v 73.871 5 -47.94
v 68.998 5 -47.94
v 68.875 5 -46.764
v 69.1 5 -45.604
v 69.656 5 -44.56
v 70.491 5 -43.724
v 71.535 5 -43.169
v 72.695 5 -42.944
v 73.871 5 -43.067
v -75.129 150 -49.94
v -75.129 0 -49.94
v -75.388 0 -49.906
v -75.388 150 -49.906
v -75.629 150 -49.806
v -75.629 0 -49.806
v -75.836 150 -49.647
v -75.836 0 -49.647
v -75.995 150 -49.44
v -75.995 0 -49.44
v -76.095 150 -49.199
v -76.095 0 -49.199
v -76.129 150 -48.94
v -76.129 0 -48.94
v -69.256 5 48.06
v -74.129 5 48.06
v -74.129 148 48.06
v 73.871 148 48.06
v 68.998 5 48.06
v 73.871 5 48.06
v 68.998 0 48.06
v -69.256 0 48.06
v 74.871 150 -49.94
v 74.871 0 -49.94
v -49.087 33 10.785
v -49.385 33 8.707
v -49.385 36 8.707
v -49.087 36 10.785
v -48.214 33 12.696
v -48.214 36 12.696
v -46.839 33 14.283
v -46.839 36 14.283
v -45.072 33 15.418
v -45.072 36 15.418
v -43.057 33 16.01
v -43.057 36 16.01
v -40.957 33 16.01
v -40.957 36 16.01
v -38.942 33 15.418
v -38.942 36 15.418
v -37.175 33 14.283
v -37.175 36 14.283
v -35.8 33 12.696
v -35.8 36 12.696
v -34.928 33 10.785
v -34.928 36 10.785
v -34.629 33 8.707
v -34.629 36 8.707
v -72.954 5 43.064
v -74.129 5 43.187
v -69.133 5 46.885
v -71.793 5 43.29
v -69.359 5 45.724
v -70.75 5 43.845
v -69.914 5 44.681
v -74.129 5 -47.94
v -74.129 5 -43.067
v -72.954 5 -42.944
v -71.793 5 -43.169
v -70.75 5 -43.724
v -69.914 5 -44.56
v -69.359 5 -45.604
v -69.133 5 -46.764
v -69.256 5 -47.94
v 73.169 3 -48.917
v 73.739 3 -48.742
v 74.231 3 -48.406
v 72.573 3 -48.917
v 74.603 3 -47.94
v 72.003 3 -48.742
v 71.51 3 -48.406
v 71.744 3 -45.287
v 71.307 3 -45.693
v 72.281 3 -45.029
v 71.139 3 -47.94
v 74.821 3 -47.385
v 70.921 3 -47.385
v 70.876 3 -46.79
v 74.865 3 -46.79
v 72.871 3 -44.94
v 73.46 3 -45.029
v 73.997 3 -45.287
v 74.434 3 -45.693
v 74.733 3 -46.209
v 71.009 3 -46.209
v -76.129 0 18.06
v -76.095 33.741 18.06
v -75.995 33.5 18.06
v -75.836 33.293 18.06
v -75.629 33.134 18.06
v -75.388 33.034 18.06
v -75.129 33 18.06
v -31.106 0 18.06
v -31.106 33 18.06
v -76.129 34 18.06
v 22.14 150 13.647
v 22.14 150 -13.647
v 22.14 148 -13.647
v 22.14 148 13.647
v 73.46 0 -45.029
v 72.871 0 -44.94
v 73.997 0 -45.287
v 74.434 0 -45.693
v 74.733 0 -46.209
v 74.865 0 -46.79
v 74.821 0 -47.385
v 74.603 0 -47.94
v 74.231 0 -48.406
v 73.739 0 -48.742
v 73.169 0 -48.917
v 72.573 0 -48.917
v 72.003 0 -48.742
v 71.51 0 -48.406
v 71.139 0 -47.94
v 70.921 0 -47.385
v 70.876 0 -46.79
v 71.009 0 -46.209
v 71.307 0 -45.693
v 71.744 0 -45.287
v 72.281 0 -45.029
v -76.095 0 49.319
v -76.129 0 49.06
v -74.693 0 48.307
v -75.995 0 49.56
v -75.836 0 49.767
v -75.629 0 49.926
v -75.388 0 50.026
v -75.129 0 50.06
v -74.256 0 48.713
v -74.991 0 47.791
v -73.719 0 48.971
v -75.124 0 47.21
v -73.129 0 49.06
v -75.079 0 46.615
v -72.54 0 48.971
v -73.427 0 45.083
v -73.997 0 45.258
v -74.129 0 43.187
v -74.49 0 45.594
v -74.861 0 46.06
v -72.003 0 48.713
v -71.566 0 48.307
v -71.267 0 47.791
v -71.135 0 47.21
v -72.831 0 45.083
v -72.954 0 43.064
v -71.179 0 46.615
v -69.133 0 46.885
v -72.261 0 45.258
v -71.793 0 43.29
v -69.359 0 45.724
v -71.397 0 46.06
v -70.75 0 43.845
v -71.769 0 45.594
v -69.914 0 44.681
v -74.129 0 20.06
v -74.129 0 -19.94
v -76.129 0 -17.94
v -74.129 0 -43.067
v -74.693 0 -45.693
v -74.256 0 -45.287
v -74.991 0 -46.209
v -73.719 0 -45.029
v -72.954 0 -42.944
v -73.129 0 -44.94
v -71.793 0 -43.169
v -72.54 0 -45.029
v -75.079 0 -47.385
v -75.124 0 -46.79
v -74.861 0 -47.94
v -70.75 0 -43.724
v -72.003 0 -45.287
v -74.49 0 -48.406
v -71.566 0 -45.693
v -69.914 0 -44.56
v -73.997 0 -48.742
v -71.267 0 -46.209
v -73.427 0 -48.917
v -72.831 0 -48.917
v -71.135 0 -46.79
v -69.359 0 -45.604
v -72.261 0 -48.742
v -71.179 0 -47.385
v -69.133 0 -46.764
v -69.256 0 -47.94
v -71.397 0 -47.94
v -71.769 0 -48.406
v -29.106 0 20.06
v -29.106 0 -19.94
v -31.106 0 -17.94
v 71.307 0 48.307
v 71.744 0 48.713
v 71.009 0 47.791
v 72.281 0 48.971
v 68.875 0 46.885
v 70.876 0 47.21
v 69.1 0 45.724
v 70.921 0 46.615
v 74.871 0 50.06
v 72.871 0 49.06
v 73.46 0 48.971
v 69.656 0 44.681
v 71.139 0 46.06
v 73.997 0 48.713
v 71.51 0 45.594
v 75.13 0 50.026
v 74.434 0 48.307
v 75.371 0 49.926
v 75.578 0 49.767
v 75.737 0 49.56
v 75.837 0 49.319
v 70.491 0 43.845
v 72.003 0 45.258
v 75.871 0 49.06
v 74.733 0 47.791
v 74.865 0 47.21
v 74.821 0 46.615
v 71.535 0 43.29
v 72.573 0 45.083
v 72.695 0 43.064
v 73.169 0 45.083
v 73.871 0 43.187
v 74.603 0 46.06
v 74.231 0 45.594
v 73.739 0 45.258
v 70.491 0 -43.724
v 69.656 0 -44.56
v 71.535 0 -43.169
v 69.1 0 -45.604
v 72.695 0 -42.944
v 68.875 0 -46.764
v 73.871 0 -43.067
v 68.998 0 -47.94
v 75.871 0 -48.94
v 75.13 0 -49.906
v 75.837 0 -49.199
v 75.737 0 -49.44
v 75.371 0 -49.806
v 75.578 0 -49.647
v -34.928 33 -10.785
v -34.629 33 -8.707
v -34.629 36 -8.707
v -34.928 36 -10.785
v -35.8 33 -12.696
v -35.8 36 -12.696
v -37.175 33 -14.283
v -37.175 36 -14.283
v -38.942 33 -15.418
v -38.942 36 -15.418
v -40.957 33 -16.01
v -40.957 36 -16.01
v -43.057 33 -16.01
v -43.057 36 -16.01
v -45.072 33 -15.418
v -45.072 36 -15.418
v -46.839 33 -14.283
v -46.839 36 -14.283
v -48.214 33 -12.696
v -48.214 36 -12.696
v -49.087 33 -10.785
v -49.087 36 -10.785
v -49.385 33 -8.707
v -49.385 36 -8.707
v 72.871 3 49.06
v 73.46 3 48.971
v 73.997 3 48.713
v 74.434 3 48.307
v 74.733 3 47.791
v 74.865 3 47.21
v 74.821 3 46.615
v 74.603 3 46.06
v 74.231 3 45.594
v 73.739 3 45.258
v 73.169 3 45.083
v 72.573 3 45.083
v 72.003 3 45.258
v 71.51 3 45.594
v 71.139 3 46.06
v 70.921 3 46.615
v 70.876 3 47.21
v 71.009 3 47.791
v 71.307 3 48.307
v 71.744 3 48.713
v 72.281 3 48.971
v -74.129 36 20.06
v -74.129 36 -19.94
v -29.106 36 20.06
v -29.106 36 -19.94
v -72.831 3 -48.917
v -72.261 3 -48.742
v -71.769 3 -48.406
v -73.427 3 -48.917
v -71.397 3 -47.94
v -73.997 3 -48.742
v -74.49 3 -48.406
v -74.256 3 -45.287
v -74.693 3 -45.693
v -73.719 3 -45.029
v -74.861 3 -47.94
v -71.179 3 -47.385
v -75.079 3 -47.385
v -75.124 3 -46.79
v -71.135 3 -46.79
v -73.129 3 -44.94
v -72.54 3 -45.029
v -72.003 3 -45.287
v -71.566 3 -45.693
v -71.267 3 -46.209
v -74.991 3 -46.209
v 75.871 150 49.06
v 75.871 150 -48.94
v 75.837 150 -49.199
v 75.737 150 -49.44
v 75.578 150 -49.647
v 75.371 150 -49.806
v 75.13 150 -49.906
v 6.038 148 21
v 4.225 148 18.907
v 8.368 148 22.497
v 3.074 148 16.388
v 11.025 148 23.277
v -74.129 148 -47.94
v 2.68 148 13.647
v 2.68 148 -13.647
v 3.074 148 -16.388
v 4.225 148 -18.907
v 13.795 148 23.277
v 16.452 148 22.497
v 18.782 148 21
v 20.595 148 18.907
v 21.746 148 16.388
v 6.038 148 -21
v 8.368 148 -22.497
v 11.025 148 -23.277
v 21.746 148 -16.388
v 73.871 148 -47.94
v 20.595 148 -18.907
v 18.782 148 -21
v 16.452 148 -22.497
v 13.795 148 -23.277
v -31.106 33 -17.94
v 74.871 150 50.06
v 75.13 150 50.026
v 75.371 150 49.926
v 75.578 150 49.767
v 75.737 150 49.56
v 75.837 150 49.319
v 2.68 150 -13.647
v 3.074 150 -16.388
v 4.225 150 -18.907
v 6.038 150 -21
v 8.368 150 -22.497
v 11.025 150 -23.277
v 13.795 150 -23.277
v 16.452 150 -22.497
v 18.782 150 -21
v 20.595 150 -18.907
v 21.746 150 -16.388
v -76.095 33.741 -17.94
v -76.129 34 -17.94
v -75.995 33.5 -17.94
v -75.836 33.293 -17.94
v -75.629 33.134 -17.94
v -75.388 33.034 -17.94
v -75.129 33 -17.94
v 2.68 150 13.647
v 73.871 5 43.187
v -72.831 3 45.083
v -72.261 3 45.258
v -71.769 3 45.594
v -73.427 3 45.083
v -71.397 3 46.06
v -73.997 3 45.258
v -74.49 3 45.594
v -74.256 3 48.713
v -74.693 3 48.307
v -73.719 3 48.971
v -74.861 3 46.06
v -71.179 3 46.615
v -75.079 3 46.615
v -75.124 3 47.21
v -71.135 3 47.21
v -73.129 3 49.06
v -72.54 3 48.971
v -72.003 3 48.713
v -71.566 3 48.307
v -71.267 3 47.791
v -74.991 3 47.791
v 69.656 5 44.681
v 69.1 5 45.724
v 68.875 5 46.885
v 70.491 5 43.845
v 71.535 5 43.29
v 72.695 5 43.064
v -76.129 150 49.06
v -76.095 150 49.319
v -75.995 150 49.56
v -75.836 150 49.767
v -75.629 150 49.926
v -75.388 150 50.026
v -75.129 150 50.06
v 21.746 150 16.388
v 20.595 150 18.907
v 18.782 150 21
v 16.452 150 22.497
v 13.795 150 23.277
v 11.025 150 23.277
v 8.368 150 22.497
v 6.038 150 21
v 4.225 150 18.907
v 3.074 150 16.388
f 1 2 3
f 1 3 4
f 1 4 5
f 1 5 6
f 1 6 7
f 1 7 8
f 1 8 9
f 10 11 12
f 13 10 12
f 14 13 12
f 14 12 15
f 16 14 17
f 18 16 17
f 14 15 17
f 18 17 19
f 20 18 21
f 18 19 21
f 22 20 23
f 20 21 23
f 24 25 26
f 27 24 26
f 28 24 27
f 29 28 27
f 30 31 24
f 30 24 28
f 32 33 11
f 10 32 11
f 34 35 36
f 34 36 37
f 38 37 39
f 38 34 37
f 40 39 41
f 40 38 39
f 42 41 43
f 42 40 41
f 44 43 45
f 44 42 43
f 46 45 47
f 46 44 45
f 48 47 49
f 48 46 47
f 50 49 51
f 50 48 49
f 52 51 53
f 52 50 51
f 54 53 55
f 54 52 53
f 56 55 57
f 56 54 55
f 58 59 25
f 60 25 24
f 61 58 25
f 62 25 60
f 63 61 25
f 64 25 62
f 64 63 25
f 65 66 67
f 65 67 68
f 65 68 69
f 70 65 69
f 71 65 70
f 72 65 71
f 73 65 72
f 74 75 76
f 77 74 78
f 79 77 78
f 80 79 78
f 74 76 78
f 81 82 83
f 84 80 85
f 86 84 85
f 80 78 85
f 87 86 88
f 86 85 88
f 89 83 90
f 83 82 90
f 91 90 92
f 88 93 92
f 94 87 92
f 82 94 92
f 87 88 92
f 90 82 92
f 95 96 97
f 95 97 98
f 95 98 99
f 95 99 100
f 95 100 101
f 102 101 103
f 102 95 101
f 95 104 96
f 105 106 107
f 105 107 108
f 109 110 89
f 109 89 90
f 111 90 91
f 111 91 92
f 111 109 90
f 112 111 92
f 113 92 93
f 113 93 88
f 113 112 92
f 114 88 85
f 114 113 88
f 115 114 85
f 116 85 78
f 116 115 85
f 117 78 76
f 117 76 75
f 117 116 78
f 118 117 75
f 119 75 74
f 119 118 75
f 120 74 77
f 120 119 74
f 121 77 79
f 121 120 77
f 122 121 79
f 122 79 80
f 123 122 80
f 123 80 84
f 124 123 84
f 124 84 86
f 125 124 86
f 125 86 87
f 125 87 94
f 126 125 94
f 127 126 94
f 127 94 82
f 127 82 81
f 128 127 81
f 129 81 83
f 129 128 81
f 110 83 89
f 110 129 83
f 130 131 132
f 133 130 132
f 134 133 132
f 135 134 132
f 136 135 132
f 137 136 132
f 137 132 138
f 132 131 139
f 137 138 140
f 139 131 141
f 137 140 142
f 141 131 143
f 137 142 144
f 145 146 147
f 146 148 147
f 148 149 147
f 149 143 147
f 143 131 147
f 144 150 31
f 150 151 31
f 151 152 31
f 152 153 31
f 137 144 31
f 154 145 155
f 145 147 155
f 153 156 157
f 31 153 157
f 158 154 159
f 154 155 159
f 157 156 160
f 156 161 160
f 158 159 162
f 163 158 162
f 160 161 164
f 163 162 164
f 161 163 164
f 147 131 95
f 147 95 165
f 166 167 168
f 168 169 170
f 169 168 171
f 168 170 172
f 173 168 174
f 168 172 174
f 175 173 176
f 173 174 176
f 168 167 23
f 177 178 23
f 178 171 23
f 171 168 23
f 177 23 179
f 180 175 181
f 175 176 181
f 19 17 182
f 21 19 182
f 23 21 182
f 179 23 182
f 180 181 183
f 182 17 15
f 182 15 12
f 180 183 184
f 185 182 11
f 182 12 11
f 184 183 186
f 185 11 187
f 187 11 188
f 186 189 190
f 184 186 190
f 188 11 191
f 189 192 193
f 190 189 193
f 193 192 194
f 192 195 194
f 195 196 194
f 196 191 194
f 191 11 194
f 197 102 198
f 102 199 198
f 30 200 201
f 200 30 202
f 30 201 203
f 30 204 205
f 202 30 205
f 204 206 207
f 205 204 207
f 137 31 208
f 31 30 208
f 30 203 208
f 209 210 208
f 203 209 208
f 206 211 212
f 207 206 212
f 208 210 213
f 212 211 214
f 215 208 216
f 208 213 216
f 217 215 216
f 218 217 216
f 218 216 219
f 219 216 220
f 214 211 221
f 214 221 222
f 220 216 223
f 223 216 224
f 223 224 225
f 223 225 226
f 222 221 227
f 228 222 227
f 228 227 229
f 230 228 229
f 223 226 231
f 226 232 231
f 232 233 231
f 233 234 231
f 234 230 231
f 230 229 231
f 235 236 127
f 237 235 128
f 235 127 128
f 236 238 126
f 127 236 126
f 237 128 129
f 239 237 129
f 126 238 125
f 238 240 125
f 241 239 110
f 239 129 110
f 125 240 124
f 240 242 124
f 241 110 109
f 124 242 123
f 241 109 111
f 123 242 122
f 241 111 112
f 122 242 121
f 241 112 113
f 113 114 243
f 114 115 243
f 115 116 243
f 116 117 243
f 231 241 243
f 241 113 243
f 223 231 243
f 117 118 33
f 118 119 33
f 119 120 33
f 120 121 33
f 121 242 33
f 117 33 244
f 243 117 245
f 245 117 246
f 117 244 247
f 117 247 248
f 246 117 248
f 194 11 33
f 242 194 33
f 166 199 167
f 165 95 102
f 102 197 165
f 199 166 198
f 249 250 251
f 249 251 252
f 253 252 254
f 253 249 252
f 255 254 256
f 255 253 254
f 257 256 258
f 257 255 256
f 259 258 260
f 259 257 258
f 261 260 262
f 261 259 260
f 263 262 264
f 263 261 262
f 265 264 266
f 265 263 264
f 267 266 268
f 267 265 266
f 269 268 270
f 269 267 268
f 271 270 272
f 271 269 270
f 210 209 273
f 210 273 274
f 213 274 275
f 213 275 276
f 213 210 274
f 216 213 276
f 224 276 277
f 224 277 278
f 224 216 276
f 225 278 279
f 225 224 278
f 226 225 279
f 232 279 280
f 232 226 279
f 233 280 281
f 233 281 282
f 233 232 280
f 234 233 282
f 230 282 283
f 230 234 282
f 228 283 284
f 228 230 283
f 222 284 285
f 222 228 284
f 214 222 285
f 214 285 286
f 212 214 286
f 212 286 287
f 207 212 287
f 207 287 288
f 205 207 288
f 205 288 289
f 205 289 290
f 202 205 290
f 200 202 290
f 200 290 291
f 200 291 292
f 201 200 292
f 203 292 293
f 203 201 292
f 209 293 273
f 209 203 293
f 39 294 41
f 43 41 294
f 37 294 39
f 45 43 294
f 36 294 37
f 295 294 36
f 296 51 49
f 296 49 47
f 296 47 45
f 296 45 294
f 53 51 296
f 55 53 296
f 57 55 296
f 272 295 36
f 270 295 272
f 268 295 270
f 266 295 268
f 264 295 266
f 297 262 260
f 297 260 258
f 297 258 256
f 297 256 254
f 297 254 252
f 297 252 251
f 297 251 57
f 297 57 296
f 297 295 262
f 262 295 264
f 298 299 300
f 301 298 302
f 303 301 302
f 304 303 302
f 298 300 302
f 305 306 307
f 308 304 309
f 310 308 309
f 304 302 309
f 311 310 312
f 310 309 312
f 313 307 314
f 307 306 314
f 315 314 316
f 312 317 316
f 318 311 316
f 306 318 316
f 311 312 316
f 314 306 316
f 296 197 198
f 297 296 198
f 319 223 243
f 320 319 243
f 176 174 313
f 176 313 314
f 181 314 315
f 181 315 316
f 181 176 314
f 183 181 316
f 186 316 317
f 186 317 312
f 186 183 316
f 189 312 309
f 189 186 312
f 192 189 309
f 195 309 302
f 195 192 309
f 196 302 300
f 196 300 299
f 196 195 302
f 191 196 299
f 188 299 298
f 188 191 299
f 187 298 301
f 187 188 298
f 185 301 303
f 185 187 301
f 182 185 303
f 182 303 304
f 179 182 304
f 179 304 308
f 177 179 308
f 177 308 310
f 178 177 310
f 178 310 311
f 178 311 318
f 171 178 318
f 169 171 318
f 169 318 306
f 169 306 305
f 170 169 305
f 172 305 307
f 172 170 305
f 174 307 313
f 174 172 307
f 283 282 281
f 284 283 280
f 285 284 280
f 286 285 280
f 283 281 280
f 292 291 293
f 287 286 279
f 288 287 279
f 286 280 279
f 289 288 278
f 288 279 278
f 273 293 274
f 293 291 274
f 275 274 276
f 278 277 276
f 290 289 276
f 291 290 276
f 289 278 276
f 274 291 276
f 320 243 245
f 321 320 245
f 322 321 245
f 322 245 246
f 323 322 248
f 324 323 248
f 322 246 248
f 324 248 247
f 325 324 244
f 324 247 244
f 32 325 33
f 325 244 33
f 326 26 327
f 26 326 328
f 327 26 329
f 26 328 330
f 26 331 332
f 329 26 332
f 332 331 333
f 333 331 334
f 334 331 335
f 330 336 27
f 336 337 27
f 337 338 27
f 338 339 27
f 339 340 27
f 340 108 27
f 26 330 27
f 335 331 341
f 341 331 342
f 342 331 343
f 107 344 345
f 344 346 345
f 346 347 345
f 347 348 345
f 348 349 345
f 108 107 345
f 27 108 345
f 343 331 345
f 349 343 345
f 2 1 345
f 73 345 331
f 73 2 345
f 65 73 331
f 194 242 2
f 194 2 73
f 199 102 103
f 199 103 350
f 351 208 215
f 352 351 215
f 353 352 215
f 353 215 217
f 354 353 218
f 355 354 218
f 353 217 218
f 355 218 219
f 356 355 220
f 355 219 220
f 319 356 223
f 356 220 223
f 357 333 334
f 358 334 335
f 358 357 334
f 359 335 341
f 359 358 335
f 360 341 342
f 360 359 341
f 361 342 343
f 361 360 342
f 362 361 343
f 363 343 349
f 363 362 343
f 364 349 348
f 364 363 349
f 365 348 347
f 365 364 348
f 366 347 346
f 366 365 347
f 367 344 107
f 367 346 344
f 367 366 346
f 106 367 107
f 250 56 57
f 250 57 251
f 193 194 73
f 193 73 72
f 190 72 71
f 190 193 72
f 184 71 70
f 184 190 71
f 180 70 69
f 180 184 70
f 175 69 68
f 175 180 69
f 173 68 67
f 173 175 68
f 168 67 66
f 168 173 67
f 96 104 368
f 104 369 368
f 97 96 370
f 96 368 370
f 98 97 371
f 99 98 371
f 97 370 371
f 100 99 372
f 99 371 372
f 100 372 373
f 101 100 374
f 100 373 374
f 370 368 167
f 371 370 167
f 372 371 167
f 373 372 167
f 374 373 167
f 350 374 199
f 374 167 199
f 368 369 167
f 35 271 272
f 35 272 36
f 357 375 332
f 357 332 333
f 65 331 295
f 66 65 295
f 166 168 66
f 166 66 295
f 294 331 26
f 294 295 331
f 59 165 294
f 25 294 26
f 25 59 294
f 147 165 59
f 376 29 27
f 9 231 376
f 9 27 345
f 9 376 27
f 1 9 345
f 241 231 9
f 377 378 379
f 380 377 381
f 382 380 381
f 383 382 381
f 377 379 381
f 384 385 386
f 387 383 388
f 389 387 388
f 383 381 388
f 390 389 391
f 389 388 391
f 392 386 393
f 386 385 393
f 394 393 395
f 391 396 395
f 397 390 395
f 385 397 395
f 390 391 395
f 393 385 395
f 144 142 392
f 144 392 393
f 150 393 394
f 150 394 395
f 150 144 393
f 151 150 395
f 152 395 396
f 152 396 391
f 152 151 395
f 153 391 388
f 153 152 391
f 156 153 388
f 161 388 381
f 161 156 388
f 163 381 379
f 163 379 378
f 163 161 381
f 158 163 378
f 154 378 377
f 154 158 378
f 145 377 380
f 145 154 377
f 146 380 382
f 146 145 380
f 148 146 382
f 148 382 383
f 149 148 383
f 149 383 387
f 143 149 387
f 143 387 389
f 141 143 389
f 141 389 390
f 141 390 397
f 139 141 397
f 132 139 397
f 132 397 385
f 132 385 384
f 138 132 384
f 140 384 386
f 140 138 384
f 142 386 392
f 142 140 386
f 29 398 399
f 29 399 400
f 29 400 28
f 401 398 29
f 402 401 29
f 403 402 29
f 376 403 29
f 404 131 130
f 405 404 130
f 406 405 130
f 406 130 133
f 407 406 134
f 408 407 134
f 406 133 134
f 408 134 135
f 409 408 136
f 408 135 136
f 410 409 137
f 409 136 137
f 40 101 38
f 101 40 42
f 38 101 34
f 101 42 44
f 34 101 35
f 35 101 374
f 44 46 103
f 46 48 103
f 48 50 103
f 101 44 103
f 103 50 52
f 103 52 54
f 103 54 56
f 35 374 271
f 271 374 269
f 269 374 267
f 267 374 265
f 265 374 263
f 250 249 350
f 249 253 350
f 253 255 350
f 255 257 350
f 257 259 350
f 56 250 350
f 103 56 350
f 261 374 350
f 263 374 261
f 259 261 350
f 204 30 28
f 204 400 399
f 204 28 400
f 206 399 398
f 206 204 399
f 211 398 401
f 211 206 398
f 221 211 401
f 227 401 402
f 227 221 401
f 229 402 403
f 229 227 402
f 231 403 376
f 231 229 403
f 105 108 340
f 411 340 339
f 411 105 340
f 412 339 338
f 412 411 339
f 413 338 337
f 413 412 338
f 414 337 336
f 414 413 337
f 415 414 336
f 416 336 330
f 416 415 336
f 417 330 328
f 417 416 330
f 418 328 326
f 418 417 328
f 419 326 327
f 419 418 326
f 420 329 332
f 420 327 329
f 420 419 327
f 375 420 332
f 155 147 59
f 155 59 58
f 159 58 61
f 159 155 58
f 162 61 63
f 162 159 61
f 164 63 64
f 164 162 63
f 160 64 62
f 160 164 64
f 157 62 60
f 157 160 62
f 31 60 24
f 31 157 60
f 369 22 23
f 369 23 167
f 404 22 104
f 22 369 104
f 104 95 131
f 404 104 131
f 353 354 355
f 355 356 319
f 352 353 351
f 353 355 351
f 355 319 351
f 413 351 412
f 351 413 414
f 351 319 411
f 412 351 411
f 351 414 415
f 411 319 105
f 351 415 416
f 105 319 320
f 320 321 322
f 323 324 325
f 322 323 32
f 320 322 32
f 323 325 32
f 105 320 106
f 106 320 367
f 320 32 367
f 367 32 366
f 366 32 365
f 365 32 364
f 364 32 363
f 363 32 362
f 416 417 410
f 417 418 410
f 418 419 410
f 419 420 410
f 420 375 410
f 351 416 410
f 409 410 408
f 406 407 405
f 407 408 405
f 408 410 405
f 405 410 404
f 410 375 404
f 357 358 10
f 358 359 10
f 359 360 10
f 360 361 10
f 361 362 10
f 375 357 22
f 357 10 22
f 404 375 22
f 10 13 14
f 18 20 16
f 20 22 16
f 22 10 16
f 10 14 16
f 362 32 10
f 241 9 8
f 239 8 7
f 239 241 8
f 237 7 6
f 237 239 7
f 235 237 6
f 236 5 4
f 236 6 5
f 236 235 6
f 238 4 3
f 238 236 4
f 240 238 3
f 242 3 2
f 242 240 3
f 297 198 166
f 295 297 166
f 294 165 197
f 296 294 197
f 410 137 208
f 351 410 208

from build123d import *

# Parameters (mm, degrees)
BOSS_EXTRUDE7_DEPTH  = 150
SKETCH2_42_R         = 2
CUT_EXTRUDE8_DEPTH   = 3
SHELL4_DEPTH         = 148
SHELL4_START         = 5
SHELL4_2_DEPTH       = 143
SKETCH2_43_W         = 45.023033392
SKETCH2_43_H         = 36
BOSS_EXTRUDE8_DEPTH  = 36
SKETCH2_44_W         = 45.023033392
SKETCH2_44_H         = 36
CUT_EXTRUDE9_DEPTH   = 33
CUT_EXTRUDE11_DEPTH  = 33
FILLET4_R            = 1
BOSS_EXTRUDE11_DEPTH = 40
CUT_EXTRUDE16_DEPTH  = 40


# Read off the part's stored shape, not the designer's step: Shell4
with BuildPart() as part:
    # Sketch2 → Boss-Extrude7 (new body)
    with BuildSketch(Plane(origin=(0, 0, 0), x_dir=(1, 0, 0), z_dir=(0, 1, 0))):
        with BuildLine():
            Line((-76.129191463, 48.939688446), (-76.129191463, -49.060311554))
            ThreePointArc((-76.129191463, -49.060311554), (-75.836298244, -49.767418335), (-75.129191463, -50.060311554))
            Line((-75.129191463, -50.060311554), (74.870808537, -50.060311554))
            ThreePointArc((74.870808537, -50.060311554), (75.577915319, -49.767418335), (75.870808537, -49.060311554))
            Line((75.870808537, -49.060311554), (75.870808537, 48.939688446))
            ThreePointArc((75.870808537, 48.939688446), (75.577915319, 49.646795227), (74.870808537, 49.939688446))
            Line((74.870808537, 49.939688446), (-75.129191463, 49.939688446))
            ThreePointArc((-75.129191463, 49.939688446), (-75.836298244, 49.646795227), (-76.129191463, 48.939688446))
        make_face()
    extrude(amount=BOSS_EXTRUDE7_DEPTH)

    # Sketch2<42> → Cut-Extrude8 (cut)
    with BuildSketch(Plane(origin=(0, 0, 0), x_dir=(1, 0, 0), z_dir=(0, 1, 0))):
        with Locations(Location((-73.129191463, 46.939688446, 0), (0, 0, 270))):
            Circle(SKETCH2_42_R)
        with Locations(Location((72.870808537, 46.939688446, 0), (0, 0, 270))):
            Circle(SKETCH2_42_R)
        with Locations(Location((72.870808537, -47.060311554, 0), (0, 0, 270))):
            Circle(SKETCH2_42_R)
        with Locations(Location((-73.129191463, -47.060311554, 0), (0, 0, 270))):
            Circle(SKETCH2_42_R)
    extrude(amount=CUT_EXTRUDE8_DEPTH, mode=Mode.SUBTRACT)

    # Shell4 outline → Shell4 (cut)
    with BuildSketch(Plane(origin=(0, 0, 0), x_dir=(1, 0, 0), z_dir=(0, 1, 0))):
        with BuildLine():
            Line((-74.129191463, 43.0667051), (-74.129191463, -43.187328208))
            ThreePointArc((-74.129191463, -43.187328208), (-70.300764338, -44.231884429), (-69.256208116, -48.060311554))
            Line((-69.256208116, -48.060311554), (68.997825191, -48.060311554))
            ThreePointArc((68.997825191, -48.060311554), (70.042381413, -44.231884429), (73.870808537, -43.187328208))
            Line((73.870808537, -43.187328208), (73.870808537, 43.0667051))
            ThreePointArc((73.870808537, 43.0667051), (70.042381413, 44.111261321), (68.997825191, 47.939688446))
            Line((68.997825191, 47.939688446), (-69.256208116, 47.939688446))
            ThreePointArc((-69.256208116, 47.939688446), (-70.300764338, 44.111261321), (-74.129191463, 43.0667051))
        make_face()
    extrude(amount=SHELL4_DEPTH, mode=Mode.SUBTRACT)

    # Shell4 2 outline → Shell4 2 (cut)
    with BuildSketch(Plane(origin=(0, 0, 0), x_dir=(1, 0, 0), z_dir=(0, 1, 0)).offset(SHELL4_START)):
        with BuildLine():
            Line((-74.129191463, -43.187328208), (-74.129191463, -48.060311554))
            Line((-74.129191463, -48.060311554), (-69.256208116, -48.060311554))
            ThreePointArc((-69.256208116, -48.060311554), (-70.300764338, -44.231884429), (-74.129191463, -43.187328208))
        make_face()
        with BuildLine():
            Line((-74.129191463, 47.939688446), (-74.129191463, 43.0667051))
            ThreePointArc((-74.129191463, 43.0667051), (-70.300764338, 44.111261321), (-69.256208116, 47.939688446))
            Line((-69.256208116, 47.939688446), (-74.129191463, 47.939688446))
        make_face()
        with BuildLine():
            ThreePointArc((73.870808537, -43.187328208), (70.042381413, -44.231884429), (68.997825191, -48.060311554))
            Line((68.997825191, -48.060311554), (73.870808537, -48.060311554))
            Line((73.870808537, -48.060311554), (73.870808537, -43.187328208))
        make_face()
        with BuildLine():
            Line((73.870808537, 47.939688446), (68.997825191, 47.939688446))
            ThreePointArc((68.997825191, 47.939688446), (70.042381413, 44.111261321), (73.870808537, 43.0667051))
            Line((73.870808537, 43.0667051), (73.870808537, 47.939688446))
        make_face()
    extrude(amount=SHELL4_2_DEPTH, mode=Mode.SUBTRACT)

    # Sketch2<43> → Boss-Extrude8 (add)
    with BuildSketch(Plane(origin=(0, 0, 0), x_dir=(1, 0, 0), z_dir=(0, 1, 0))):
        Polygon((-76.129191463, -20.060311554), (-29.106158071, -20.060311554), (-29.106158071, 19.939688446), (-76.129191463, 19.939688446), (-76.129191463, 17.939688446), (-31.106158071, 17.939688446), (-31.106158071, -18.060311554), (-76.129191463, -18.060311554), align=None)
        with Locations((-53.617674767, -0.060311554)):
            Rectangle(SKETCH2_43_W, SKETCH2_43_H)
    extrude(amount=BOSS_EXTRUDE8_DEPTH)

    # Sketch2<44> → Cut-Extrude9 (cut)
    with BuildSketch(Plane(origin=(0, 0, 0), x_dir=(1, 0, 0), z_dir=(0, 1, 0))):
        with Locations((-53.617674767, -0.060311554)):
            Rectangle(SKETCH2_44_W, SKETCH2_44_H)
    extrude(amount=CUT_EXTRUDE9_DEPTH, mode=Mode.SUBTRACT)

    # Sketch7 → Cut-Extrude11 (cut)
    with BuildSketch(Plane.XZ.offset(-33)):
        with BuildLine():
            Line((-49.385393046, -8.706663468), (-49.385393046, 8.706663468))
            ThreePointArc((-49.385393046, 8.706663468), (-42.00713359, 16.084922924), (-34.628874134, 8.706663468))
            Line((-34.628874134, 8.706663468), (-34.628874134, -8.706663468))
            ThreePointArc((-34.628874134, -8.706663468), (-42.00713359, -16.084922924), (-49.385393046, -8.706663468))
        make_face()
    extrude(amount=-CUT_EXTRUDE11_DEPTH, mode=Mode.SUBTRACT)

    # Fillet4
    fillet4_edges = [part.edges().sort_by_distance(p)[0] for p in [
        (-76.129191463, 33, 0.060311554),
    ]]
    fillet(fillet4_edges, radius=FILLET4_R)

    # Sketch8 → Boss-Extrude11 (add)
    with BuildSketch(Plane(origin=(0, 150, 0), x_dir=(1, 0, 0), z_dir=(0, 1, 0))):
        with BuildLine():
            Line((2.680111603, -13.646632902), (2.680111603, 13.646632902))
            ThreePointArc((2.680111603, 13.646632902), (12.409959802, 23.376481102), (22.139808002, 13.646632902))
            Line((22.139808002, 13.646632902), (22.139808002, -13.646632902))
            ThreePointArc((22.139808002, -13.646632902), (12.409959802, -23.376481102), (2.680111603, -13.646632902))
        make_face()
    extrude(amount=-BOSS_EXTRUDE11_DEPTH)

    # Sketch8<7> → Cut-Extrude16 (cut)
    with BuildSketch(Plane(origin=(0, 150, 0), x_dir=(1, 0, 0), z_dir=(0, 1, 0))):
        with BuildLine():
            Line((2.680111603, -13.646632902), (2.680111603, 13.646632902))
            ThreePointArc((2.680111603, 13.646632902), (12.409959802, 23.376481102), (22.139808002, 13.646632902))
            Line((22.139808002, 13.646632902), (22.139808002, -13.646632902))
            ThreePointArc((22.139808002, -13.646632902), (12.409959802, -23.376481102), (2.680111603, -13.646632902))
        make_face()
    extrude(amount=-CUT_EXTRUDE16_DEPTH, mode=Mode.SUBTRACT)


solid = part.part
